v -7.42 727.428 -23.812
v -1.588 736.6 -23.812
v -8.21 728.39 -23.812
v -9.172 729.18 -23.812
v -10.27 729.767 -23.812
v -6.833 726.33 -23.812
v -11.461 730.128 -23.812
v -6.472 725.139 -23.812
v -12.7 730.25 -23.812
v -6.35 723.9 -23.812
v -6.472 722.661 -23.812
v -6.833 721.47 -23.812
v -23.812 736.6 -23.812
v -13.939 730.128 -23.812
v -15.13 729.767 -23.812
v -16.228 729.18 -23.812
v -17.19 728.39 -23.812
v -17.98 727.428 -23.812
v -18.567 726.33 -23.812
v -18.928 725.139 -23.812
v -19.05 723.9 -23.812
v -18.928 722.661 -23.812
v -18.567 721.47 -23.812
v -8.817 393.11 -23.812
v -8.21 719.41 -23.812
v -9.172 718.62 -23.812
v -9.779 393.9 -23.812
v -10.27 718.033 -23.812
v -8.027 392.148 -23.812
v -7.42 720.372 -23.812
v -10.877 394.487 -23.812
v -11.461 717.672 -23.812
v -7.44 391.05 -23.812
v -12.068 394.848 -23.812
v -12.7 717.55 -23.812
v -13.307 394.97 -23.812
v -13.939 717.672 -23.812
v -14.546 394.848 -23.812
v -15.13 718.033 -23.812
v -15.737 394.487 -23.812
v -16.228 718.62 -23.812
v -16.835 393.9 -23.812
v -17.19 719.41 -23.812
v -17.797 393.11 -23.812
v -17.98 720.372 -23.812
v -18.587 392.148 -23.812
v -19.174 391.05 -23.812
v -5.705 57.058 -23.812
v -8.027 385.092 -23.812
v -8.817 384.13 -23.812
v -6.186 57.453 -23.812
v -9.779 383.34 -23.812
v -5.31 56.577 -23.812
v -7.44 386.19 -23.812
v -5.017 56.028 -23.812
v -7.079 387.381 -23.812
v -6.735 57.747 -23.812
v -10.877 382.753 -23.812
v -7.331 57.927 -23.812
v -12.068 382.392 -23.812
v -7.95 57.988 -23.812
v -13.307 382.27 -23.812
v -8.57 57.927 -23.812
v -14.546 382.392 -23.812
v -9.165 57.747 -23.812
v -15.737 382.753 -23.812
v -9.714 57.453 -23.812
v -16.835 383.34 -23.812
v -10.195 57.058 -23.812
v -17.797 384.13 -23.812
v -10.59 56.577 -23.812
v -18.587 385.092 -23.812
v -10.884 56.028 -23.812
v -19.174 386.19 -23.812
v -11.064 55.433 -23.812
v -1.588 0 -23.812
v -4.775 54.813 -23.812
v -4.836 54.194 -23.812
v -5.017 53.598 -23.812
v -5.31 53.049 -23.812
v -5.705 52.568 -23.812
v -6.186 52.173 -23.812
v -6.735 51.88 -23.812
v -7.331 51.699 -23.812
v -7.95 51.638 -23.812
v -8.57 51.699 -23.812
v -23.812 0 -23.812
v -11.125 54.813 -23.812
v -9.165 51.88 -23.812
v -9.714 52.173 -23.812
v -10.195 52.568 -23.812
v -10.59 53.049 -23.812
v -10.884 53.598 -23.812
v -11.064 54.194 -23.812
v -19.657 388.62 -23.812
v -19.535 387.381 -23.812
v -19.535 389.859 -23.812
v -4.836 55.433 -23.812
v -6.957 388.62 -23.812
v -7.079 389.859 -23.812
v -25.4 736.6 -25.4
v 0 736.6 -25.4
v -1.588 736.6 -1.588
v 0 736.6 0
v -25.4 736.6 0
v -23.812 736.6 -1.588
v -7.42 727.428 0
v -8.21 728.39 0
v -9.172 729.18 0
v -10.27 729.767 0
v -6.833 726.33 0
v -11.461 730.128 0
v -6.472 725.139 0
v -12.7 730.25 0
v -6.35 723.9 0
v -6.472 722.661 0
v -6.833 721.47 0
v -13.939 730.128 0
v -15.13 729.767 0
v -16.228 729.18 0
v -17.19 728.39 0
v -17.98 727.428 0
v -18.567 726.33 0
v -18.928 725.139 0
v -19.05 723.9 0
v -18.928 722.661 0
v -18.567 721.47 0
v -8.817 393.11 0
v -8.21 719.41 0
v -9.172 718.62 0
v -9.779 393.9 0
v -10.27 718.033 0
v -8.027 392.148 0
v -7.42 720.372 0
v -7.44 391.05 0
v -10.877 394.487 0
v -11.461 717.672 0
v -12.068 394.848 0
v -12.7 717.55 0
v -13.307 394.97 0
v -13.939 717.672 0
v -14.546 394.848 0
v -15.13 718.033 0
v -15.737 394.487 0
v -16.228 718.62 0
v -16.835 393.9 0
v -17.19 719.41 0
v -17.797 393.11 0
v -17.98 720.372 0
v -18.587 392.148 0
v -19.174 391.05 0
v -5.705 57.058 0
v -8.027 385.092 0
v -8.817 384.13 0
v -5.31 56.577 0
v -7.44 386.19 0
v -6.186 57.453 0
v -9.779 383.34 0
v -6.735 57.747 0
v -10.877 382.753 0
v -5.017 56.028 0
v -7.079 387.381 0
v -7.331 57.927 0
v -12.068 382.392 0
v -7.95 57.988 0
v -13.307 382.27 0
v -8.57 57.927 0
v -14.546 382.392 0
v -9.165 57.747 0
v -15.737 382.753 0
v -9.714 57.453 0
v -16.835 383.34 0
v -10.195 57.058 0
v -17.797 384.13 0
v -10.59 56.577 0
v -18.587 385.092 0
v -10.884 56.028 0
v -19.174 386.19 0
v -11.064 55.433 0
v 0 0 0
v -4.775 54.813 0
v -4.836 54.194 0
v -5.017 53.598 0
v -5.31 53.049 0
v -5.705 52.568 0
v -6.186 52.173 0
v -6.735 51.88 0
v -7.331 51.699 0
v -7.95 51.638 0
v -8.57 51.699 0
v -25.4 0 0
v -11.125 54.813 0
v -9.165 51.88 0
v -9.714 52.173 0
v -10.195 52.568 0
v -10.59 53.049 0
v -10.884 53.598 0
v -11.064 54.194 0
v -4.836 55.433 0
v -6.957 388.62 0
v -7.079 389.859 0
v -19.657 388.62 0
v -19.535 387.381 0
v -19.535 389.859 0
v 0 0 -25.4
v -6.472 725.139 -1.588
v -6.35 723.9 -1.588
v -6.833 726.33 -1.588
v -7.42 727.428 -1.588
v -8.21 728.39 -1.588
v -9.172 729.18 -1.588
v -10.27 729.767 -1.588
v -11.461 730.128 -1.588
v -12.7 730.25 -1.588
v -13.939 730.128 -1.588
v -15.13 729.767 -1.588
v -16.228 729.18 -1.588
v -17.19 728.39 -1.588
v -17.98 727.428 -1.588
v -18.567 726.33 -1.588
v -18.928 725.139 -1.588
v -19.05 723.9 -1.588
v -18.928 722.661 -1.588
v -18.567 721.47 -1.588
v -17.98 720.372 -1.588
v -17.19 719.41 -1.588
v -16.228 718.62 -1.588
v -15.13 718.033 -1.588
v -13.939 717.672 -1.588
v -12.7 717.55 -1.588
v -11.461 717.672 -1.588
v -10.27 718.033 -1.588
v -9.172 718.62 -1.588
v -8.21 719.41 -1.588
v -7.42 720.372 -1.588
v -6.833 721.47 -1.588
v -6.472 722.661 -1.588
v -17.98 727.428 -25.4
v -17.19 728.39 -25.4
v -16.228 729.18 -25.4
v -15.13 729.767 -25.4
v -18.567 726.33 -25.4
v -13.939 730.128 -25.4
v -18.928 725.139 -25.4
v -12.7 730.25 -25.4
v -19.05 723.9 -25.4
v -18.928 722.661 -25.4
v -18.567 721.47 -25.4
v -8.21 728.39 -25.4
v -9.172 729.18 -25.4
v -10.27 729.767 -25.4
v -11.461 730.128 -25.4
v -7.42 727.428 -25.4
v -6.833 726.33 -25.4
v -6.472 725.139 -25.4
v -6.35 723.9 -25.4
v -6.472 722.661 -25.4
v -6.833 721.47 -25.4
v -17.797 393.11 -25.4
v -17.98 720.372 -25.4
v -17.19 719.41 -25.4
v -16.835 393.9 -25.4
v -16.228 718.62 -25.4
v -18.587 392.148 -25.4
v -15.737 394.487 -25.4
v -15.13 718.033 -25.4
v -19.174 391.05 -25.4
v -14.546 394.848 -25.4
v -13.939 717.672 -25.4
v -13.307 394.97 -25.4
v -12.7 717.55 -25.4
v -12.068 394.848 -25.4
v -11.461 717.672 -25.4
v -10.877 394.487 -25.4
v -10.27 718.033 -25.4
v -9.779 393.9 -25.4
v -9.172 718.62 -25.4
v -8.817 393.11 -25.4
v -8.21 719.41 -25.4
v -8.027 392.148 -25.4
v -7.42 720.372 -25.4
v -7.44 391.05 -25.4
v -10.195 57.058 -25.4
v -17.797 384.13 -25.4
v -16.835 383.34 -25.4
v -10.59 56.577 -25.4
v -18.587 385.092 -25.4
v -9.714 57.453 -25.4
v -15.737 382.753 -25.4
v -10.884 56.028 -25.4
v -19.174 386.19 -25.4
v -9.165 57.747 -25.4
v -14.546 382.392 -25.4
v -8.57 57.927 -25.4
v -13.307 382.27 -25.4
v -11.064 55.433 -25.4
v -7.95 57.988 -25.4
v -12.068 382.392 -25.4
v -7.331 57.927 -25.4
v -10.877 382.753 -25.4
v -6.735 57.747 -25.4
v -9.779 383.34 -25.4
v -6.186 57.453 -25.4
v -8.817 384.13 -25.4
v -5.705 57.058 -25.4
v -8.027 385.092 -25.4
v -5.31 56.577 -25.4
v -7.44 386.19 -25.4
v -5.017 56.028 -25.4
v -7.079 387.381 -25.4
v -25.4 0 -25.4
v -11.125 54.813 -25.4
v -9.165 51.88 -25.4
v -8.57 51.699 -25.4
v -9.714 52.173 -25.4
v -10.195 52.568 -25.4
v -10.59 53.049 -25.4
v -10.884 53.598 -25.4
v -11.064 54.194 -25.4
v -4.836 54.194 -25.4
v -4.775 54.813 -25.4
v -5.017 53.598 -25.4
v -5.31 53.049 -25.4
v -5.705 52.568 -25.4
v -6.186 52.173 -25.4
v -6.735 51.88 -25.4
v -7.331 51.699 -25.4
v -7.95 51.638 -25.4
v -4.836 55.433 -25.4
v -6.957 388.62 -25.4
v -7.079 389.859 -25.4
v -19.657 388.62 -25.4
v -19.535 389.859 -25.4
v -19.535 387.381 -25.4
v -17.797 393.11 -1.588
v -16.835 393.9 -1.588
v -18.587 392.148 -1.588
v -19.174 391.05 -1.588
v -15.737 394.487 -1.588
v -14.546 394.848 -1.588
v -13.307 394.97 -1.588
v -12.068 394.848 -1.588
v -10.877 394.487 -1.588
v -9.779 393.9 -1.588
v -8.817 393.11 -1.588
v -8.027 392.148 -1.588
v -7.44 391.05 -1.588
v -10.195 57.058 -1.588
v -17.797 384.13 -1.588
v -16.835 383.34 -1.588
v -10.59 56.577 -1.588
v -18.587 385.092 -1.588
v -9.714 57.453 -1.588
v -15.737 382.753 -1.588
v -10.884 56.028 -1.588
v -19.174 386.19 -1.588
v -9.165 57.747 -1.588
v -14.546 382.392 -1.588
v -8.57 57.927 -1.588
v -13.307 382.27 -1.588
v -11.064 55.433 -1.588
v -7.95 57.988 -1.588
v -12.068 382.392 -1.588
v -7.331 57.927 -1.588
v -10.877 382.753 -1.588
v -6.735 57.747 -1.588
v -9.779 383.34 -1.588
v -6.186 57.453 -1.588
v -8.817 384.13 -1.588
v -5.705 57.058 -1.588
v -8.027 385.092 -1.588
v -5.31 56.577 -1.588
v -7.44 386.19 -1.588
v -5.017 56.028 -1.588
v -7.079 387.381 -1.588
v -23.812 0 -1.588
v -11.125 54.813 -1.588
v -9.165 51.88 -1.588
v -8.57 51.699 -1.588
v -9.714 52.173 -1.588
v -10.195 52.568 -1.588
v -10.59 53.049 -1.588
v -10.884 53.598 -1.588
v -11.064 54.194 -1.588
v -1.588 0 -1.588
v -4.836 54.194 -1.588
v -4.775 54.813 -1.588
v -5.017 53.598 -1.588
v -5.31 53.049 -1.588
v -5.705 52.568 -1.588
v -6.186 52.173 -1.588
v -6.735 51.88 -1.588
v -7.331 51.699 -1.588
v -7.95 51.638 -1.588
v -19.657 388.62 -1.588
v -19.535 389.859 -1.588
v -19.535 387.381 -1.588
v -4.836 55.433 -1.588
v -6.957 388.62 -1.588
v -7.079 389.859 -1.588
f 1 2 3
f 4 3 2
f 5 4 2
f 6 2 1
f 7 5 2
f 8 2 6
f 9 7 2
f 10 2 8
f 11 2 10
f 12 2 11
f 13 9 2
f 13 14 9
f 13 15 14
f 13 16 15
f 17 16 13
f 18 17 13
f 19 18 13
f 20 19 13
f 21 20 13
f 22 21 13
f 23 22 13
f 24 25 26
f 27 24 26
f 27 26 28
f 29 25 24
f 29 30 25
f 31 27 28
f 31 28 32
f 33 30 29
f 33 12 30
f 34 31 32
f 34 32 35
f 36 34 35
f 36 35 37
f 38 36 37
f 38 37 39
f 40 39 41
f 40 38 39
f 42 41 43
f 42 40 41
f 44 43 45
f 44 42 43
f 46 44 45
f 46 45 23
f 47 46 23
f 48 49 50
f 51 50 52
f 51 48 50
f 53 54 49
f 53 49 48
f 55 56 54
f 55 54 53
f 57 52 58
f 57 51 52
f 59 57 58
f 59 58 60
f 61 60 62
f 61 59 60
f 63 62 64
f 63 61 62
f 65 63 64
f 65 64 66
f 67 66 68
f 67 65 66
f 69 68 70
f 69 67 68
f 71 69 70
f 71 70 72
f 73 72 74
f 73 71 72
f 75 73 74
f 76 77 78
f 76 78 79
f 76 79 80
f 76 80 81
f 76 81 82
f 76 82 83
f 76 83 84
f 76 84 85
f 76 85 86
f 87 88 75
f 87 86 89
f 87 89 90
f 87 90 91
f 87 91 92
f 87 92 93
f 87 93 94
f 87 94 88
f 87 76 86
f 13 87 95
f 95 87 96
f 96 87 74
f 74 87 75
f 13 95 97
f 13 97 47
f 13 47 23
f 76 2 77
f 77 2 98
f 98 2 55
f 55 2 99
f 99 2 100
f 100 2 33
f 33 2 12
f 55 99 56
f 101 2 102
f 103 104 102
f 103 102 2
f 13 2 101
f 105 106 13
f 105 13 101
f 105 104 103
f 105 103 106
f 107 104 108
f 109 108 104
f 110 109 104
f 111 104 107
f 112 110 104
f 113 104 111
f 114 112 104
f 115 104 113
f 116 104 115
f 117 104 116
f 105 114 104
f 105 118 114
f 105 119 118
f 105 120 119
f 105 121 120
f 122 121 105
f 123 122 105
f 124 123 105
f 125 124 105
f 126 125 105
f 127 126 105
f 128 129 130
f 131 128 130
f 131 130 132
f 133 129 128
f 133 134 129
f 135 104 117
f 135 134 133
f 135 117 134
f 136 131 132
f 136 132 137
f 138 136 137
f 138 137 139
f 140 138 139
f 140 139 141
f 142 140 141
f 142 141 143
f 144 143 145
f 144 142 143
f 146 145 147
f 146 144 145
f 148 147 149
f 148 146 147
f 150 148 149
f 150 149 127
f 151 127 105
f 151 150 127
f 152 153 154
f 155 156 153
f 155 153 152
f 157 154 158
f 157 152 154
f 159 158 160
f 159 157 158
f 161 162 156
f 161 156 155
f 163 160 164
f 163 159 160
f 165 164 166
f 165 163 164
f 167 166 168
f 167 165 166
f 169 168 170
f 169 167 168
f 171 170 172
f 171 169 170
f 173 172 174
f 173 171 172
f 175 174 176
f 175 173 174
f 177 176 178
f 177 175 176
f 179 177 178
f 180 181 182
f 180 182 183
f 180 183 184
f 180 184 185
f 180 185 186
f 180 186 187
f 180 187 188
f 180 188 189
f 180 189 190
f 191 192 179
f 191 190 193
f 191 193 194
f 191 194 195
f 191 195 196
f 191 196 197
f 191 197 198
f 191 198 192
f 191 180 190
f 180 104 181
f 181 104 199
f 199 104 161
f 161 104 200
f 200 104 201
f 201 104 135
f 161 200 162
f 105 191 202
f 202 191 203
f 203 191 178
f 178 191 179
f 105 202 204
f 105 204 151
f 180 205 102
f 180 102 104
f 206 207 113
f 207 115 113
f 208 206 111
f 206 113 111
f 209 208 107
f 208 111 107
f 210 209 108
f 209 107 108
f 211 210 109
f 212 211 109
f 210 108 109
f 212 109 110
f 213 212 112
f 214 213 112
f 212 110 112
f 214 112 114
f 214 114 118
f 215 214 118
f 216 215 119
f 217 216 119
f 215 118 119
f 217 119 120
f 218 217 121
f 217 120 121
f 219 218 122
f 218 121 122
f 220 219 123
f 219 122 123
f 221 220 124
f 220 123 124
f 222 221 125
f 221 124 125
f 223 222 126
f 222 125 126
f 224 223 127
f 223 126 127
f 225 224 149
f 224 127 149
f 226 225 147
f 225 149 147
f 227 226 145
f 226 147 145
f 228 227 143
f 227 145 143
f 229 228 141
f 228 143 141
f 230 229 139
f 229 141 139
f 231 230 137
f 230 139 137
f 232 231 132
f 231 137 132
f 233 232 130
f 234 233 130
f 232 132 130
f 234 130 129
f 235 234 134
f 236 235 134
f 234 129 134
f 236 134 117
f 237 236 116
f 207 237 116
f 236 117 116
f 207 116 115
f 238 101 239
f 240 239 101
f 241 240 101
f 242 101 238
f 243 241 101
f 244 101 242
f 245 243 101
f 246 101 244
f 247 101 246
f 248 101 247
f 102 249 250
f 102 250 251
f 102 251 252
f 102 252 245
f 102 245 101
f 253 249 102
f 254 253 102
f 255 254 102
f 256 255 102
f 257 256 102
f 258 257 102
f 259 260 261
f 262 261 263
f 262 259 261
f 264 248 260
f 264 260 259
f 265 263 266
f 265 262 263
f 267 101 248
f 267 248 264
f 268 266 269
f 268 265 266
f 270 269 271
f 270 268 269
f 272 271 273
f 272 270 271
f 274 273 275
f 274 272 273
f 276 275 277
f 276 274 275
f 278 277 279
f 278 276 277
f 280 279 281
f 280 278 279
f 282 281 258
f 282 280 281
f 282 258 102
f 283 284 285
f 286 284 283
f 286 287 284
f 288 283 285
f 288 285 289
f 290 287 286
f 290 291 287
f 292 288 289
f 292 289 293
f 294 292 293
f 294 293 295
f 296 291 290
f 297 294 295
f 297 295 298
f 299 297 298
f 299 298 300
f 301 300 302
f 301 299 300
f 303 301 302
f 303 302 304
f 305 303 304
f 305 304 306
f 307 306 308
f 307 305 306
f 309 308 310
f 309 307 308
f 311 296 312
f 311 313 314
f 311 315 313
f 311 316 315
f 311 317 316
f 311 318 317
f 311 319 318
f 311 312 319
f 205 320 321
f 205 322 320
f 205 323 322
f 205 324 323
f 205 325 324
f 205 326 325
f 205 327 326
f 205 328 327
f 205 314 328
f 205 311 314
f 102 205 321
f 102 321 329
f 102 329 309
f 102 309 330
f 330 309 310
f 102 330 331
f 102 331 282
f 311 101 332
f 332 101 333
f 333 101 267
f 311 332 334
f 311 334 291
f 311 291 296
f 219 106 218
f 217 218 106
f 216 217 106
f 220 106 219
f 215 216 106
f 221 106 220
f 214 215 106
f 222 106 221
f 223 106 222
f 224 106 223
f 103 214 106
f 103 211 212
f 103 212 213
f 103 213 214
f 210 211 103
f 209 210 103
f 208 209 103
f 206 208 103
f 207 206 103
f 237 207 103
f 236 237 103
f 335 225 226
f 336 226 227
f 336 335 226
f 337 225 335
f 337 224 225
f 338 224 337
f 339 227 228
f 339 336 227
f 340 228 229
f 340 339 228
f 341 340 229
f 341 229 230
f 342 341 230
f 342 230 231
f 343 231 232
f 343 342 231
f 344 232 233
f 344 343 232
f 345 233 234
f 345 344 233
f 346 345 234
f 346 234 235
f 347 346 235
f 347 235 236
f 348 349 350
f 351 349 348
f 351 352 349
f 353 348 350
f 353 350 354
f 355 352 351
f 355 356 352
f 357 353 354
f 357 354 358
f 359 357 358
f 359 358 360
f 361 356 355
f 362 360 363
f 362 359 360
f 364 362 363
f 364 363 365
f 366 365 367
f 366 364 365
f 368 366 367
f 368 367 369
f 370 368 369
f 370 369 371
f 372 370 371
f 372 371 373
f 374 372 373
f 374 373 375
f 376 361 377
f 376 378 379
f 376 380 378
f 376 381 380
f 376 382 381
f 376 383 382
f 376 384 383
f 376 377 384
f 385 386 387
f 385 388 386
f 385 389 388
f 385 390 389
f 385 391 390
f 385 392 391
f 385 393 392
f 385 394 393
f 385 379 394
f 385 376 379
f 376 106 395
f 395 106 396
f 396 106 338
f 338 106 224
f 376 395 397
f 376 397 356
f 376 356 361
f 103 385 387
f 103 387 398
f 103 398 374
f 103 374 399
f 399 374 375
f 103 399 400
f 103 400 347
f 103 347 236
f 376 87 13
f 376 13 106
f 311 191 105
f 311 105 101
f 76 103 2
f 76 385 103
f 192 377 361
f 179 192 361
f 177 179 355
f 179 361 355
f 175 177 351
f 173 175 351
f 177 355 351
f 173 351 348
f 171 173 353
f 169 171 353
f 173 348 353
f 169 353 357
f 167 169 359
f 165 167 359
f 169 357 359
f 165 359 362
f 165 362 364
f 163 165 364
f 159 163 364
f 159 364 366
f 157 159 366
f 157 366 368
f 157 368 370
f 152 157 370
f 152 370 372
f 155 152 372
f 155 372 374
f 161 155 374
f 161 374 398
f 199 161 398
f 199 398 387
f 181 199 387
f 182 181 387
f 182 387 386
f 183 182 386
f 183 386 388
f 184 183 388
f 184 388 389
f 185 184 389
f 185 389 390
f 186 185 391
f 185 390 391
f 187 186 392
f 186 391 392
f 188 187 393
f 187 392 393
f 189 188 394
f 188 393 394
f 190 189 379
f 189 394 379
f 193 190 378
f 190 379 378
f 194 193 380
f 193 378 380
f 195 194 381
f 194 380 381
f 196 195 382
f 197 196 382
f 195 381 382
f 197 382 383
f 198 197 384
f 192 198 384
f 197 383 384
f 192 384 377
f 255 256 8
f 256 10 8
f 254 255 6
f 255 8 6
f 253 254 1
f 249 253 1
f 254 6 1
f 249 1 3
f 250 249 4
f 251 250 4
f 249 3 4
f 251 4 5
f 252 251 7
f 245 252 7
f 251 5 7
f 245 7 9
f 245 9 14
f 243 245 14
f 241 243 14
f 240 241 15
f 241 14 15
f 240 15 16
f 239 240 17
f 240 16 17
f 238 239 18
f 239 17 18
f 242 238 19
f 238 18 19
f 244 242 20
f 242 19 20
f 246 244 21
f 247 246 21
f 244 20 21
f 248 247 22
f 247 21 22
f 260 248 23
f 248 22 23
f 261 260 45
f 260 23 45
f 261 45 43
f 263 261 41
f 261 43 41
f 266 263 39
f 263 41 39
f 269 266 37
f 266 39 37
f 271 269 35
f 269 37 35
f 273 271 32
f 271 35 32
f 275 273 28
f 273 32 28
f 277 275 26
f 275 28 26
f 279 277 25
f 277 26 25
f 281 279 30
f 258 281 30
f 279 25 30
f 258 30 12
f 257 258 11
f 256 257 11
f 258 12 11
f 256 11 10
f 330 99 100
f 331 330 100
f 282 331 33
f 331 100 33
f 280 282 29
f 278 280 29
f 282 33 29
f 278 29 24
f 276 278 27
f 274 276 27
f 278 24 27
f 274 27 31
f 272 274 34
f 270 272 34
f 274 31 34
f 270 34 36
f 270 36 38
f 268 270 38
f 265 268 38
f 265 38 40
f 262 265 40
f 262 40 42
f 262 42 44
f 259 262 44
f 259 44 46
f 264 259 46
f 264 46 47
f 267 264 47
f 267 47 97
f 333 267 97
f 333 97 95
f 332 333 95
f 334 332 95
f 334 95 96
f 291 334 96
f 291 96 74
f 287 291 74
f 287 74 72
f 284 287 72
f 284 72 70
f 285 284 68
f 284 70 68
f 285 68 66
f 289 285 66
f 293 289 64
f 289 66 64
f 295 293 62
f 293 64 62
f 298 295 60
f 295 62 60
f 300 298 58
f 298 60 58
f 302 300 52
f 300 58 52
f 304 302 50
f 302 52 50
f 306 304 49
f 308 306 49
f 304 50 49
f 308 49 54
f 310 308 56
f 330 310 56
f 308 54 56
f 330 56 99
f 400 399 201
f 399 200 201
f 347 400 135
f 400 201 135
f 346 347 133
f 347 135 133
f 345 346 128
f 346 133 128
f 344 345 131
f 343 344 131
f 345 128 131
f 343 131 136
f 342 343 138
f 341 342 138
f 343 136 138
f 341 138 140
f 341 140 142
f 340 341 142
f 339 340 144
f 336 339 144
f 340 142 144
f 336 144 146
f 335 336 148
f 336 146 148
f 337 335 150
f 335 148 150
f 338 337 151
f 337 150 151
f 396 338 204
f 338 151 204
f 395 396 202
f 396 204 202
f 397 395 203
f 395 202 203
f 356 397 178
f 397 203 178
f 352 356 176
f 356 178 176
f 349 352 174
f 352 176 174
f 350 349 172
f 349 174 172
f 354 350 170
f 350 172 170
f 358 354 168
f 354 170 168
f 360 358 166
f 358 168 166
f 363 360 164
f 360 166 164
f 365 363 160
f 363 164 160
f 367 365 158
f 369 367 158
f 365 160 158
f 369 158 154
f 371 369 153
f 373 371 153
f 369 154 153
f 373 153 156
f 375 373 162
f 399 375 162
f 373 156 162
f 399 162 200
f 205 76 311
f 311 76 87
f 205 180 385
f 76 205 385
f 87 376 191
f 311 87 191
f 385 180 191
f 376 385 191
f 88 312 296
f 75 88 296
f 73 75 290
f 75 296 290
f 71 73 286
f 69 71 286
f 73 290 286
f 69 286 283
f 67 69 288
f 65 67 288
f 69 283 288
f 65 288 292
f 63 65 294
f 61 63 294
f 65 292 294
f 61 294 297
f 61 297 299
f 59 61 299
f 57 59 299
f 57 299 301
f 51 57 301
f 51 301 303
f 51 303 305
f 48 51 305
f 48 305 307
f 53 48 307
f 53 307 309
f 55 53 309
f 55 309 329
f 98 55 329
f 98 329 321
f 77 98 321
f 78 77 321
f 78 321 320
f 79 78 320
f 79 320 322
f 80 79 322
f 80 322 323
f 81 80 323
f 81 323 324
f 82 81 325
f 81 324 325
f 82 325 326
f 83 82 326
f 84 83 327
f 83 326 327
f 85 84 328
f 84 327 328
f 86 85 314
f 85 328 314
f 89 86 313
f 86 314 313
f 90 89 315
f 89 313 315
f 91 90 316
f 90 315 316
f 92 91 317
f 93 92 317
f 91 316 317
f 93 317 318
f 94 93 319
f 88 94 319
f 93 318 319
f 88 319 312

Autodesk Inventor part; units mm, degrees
ref_plane "YZ Plane" through (0, 0, 0) normal (1, 0, 0) x (0, 1, 0)
ref_plane "XZ Plane" through (0, 0, 0) normal (0, 1, 0) x (-1, 0, 0)
ref_plane "XY Plane" through (0, 0, 0) normal (0, 0, 1) x (1, 0, 0)
sketch "Sketch1" plane through (0, 0, 0) normal (0, 1, 0) x (-1, 0, 0)
  line L0 (0, 0) -> (25.4, 0)
  line L1 (25.4, 0) -> (25.4, -25.4)
  line L2 (25.4, -25.4) -> (0, -25.4)
  line L3 (0, -25.4) -> (0, 0)
  line L4 (23.8125, -23.8125) -> (23.8125, -1.5875)
  line L5 (23.8125, -1.5875) -> (1.5875, -1.5875)
  line L6 (1.5875, -1.5875) -> (1.5875, -23.8125)
  line L7 (1.5875, -23.8125) -> (23.8125, -23.8125)
  dimension "d0" = 25.4
  dimension "d1" = 25.4
  dimension "d2" = 1.5875
extrude "Extrusion1" add sketch "Sketch1" along normal blind 736.6
sketch "Sketch2" plane through (-25.4, 0, 0) normal (0, 0, 1) x (1, 0, 0)
  circle A0 centre (12.7, 723.9) radius 6.35
  line L0 (0, 736.6) -> (25.4, 736.6) projected
  circle A1 centre (12.0929, 388.62) radius 6.35
  line L1 (0, 0) -> (0, 736.6) projected
  point P0 (25.4, 0)
  dimension "d5" = 12.7
  dimension "d6" = 12.7
  dimension "d7" = 12.7
  dimension "d8" = 347.98
  dimension "d11" = 12.0929
extrude "Extrusion2" cut sketch "Sketch2" against normal blind 25.4
sketch "Sketch3" plane through (0, 0, -25.4) normal (0, 0, -1) x (-1, 0, 0)
  point P0 (0, 0)
sketch "Sketch4" plane through (0, 0, -25.4) normal (0, 0, -1) x (-1, 0, 0)
  circle A0 centre (7.9502, 54.8132) radius 3.175
  line L0 (0, 0) -> (0, 736.6) projected
  line L1 (25.4, 0) -> (0, 0) projected
  dimension "d12" = 7.9502
  dimension "d13" = 54.8132
  dimension "d14" = 6.35
extrude "Extrusion3" cut sketch "Sketch4" against normal blind 25.4
properties part number "AP 1"
